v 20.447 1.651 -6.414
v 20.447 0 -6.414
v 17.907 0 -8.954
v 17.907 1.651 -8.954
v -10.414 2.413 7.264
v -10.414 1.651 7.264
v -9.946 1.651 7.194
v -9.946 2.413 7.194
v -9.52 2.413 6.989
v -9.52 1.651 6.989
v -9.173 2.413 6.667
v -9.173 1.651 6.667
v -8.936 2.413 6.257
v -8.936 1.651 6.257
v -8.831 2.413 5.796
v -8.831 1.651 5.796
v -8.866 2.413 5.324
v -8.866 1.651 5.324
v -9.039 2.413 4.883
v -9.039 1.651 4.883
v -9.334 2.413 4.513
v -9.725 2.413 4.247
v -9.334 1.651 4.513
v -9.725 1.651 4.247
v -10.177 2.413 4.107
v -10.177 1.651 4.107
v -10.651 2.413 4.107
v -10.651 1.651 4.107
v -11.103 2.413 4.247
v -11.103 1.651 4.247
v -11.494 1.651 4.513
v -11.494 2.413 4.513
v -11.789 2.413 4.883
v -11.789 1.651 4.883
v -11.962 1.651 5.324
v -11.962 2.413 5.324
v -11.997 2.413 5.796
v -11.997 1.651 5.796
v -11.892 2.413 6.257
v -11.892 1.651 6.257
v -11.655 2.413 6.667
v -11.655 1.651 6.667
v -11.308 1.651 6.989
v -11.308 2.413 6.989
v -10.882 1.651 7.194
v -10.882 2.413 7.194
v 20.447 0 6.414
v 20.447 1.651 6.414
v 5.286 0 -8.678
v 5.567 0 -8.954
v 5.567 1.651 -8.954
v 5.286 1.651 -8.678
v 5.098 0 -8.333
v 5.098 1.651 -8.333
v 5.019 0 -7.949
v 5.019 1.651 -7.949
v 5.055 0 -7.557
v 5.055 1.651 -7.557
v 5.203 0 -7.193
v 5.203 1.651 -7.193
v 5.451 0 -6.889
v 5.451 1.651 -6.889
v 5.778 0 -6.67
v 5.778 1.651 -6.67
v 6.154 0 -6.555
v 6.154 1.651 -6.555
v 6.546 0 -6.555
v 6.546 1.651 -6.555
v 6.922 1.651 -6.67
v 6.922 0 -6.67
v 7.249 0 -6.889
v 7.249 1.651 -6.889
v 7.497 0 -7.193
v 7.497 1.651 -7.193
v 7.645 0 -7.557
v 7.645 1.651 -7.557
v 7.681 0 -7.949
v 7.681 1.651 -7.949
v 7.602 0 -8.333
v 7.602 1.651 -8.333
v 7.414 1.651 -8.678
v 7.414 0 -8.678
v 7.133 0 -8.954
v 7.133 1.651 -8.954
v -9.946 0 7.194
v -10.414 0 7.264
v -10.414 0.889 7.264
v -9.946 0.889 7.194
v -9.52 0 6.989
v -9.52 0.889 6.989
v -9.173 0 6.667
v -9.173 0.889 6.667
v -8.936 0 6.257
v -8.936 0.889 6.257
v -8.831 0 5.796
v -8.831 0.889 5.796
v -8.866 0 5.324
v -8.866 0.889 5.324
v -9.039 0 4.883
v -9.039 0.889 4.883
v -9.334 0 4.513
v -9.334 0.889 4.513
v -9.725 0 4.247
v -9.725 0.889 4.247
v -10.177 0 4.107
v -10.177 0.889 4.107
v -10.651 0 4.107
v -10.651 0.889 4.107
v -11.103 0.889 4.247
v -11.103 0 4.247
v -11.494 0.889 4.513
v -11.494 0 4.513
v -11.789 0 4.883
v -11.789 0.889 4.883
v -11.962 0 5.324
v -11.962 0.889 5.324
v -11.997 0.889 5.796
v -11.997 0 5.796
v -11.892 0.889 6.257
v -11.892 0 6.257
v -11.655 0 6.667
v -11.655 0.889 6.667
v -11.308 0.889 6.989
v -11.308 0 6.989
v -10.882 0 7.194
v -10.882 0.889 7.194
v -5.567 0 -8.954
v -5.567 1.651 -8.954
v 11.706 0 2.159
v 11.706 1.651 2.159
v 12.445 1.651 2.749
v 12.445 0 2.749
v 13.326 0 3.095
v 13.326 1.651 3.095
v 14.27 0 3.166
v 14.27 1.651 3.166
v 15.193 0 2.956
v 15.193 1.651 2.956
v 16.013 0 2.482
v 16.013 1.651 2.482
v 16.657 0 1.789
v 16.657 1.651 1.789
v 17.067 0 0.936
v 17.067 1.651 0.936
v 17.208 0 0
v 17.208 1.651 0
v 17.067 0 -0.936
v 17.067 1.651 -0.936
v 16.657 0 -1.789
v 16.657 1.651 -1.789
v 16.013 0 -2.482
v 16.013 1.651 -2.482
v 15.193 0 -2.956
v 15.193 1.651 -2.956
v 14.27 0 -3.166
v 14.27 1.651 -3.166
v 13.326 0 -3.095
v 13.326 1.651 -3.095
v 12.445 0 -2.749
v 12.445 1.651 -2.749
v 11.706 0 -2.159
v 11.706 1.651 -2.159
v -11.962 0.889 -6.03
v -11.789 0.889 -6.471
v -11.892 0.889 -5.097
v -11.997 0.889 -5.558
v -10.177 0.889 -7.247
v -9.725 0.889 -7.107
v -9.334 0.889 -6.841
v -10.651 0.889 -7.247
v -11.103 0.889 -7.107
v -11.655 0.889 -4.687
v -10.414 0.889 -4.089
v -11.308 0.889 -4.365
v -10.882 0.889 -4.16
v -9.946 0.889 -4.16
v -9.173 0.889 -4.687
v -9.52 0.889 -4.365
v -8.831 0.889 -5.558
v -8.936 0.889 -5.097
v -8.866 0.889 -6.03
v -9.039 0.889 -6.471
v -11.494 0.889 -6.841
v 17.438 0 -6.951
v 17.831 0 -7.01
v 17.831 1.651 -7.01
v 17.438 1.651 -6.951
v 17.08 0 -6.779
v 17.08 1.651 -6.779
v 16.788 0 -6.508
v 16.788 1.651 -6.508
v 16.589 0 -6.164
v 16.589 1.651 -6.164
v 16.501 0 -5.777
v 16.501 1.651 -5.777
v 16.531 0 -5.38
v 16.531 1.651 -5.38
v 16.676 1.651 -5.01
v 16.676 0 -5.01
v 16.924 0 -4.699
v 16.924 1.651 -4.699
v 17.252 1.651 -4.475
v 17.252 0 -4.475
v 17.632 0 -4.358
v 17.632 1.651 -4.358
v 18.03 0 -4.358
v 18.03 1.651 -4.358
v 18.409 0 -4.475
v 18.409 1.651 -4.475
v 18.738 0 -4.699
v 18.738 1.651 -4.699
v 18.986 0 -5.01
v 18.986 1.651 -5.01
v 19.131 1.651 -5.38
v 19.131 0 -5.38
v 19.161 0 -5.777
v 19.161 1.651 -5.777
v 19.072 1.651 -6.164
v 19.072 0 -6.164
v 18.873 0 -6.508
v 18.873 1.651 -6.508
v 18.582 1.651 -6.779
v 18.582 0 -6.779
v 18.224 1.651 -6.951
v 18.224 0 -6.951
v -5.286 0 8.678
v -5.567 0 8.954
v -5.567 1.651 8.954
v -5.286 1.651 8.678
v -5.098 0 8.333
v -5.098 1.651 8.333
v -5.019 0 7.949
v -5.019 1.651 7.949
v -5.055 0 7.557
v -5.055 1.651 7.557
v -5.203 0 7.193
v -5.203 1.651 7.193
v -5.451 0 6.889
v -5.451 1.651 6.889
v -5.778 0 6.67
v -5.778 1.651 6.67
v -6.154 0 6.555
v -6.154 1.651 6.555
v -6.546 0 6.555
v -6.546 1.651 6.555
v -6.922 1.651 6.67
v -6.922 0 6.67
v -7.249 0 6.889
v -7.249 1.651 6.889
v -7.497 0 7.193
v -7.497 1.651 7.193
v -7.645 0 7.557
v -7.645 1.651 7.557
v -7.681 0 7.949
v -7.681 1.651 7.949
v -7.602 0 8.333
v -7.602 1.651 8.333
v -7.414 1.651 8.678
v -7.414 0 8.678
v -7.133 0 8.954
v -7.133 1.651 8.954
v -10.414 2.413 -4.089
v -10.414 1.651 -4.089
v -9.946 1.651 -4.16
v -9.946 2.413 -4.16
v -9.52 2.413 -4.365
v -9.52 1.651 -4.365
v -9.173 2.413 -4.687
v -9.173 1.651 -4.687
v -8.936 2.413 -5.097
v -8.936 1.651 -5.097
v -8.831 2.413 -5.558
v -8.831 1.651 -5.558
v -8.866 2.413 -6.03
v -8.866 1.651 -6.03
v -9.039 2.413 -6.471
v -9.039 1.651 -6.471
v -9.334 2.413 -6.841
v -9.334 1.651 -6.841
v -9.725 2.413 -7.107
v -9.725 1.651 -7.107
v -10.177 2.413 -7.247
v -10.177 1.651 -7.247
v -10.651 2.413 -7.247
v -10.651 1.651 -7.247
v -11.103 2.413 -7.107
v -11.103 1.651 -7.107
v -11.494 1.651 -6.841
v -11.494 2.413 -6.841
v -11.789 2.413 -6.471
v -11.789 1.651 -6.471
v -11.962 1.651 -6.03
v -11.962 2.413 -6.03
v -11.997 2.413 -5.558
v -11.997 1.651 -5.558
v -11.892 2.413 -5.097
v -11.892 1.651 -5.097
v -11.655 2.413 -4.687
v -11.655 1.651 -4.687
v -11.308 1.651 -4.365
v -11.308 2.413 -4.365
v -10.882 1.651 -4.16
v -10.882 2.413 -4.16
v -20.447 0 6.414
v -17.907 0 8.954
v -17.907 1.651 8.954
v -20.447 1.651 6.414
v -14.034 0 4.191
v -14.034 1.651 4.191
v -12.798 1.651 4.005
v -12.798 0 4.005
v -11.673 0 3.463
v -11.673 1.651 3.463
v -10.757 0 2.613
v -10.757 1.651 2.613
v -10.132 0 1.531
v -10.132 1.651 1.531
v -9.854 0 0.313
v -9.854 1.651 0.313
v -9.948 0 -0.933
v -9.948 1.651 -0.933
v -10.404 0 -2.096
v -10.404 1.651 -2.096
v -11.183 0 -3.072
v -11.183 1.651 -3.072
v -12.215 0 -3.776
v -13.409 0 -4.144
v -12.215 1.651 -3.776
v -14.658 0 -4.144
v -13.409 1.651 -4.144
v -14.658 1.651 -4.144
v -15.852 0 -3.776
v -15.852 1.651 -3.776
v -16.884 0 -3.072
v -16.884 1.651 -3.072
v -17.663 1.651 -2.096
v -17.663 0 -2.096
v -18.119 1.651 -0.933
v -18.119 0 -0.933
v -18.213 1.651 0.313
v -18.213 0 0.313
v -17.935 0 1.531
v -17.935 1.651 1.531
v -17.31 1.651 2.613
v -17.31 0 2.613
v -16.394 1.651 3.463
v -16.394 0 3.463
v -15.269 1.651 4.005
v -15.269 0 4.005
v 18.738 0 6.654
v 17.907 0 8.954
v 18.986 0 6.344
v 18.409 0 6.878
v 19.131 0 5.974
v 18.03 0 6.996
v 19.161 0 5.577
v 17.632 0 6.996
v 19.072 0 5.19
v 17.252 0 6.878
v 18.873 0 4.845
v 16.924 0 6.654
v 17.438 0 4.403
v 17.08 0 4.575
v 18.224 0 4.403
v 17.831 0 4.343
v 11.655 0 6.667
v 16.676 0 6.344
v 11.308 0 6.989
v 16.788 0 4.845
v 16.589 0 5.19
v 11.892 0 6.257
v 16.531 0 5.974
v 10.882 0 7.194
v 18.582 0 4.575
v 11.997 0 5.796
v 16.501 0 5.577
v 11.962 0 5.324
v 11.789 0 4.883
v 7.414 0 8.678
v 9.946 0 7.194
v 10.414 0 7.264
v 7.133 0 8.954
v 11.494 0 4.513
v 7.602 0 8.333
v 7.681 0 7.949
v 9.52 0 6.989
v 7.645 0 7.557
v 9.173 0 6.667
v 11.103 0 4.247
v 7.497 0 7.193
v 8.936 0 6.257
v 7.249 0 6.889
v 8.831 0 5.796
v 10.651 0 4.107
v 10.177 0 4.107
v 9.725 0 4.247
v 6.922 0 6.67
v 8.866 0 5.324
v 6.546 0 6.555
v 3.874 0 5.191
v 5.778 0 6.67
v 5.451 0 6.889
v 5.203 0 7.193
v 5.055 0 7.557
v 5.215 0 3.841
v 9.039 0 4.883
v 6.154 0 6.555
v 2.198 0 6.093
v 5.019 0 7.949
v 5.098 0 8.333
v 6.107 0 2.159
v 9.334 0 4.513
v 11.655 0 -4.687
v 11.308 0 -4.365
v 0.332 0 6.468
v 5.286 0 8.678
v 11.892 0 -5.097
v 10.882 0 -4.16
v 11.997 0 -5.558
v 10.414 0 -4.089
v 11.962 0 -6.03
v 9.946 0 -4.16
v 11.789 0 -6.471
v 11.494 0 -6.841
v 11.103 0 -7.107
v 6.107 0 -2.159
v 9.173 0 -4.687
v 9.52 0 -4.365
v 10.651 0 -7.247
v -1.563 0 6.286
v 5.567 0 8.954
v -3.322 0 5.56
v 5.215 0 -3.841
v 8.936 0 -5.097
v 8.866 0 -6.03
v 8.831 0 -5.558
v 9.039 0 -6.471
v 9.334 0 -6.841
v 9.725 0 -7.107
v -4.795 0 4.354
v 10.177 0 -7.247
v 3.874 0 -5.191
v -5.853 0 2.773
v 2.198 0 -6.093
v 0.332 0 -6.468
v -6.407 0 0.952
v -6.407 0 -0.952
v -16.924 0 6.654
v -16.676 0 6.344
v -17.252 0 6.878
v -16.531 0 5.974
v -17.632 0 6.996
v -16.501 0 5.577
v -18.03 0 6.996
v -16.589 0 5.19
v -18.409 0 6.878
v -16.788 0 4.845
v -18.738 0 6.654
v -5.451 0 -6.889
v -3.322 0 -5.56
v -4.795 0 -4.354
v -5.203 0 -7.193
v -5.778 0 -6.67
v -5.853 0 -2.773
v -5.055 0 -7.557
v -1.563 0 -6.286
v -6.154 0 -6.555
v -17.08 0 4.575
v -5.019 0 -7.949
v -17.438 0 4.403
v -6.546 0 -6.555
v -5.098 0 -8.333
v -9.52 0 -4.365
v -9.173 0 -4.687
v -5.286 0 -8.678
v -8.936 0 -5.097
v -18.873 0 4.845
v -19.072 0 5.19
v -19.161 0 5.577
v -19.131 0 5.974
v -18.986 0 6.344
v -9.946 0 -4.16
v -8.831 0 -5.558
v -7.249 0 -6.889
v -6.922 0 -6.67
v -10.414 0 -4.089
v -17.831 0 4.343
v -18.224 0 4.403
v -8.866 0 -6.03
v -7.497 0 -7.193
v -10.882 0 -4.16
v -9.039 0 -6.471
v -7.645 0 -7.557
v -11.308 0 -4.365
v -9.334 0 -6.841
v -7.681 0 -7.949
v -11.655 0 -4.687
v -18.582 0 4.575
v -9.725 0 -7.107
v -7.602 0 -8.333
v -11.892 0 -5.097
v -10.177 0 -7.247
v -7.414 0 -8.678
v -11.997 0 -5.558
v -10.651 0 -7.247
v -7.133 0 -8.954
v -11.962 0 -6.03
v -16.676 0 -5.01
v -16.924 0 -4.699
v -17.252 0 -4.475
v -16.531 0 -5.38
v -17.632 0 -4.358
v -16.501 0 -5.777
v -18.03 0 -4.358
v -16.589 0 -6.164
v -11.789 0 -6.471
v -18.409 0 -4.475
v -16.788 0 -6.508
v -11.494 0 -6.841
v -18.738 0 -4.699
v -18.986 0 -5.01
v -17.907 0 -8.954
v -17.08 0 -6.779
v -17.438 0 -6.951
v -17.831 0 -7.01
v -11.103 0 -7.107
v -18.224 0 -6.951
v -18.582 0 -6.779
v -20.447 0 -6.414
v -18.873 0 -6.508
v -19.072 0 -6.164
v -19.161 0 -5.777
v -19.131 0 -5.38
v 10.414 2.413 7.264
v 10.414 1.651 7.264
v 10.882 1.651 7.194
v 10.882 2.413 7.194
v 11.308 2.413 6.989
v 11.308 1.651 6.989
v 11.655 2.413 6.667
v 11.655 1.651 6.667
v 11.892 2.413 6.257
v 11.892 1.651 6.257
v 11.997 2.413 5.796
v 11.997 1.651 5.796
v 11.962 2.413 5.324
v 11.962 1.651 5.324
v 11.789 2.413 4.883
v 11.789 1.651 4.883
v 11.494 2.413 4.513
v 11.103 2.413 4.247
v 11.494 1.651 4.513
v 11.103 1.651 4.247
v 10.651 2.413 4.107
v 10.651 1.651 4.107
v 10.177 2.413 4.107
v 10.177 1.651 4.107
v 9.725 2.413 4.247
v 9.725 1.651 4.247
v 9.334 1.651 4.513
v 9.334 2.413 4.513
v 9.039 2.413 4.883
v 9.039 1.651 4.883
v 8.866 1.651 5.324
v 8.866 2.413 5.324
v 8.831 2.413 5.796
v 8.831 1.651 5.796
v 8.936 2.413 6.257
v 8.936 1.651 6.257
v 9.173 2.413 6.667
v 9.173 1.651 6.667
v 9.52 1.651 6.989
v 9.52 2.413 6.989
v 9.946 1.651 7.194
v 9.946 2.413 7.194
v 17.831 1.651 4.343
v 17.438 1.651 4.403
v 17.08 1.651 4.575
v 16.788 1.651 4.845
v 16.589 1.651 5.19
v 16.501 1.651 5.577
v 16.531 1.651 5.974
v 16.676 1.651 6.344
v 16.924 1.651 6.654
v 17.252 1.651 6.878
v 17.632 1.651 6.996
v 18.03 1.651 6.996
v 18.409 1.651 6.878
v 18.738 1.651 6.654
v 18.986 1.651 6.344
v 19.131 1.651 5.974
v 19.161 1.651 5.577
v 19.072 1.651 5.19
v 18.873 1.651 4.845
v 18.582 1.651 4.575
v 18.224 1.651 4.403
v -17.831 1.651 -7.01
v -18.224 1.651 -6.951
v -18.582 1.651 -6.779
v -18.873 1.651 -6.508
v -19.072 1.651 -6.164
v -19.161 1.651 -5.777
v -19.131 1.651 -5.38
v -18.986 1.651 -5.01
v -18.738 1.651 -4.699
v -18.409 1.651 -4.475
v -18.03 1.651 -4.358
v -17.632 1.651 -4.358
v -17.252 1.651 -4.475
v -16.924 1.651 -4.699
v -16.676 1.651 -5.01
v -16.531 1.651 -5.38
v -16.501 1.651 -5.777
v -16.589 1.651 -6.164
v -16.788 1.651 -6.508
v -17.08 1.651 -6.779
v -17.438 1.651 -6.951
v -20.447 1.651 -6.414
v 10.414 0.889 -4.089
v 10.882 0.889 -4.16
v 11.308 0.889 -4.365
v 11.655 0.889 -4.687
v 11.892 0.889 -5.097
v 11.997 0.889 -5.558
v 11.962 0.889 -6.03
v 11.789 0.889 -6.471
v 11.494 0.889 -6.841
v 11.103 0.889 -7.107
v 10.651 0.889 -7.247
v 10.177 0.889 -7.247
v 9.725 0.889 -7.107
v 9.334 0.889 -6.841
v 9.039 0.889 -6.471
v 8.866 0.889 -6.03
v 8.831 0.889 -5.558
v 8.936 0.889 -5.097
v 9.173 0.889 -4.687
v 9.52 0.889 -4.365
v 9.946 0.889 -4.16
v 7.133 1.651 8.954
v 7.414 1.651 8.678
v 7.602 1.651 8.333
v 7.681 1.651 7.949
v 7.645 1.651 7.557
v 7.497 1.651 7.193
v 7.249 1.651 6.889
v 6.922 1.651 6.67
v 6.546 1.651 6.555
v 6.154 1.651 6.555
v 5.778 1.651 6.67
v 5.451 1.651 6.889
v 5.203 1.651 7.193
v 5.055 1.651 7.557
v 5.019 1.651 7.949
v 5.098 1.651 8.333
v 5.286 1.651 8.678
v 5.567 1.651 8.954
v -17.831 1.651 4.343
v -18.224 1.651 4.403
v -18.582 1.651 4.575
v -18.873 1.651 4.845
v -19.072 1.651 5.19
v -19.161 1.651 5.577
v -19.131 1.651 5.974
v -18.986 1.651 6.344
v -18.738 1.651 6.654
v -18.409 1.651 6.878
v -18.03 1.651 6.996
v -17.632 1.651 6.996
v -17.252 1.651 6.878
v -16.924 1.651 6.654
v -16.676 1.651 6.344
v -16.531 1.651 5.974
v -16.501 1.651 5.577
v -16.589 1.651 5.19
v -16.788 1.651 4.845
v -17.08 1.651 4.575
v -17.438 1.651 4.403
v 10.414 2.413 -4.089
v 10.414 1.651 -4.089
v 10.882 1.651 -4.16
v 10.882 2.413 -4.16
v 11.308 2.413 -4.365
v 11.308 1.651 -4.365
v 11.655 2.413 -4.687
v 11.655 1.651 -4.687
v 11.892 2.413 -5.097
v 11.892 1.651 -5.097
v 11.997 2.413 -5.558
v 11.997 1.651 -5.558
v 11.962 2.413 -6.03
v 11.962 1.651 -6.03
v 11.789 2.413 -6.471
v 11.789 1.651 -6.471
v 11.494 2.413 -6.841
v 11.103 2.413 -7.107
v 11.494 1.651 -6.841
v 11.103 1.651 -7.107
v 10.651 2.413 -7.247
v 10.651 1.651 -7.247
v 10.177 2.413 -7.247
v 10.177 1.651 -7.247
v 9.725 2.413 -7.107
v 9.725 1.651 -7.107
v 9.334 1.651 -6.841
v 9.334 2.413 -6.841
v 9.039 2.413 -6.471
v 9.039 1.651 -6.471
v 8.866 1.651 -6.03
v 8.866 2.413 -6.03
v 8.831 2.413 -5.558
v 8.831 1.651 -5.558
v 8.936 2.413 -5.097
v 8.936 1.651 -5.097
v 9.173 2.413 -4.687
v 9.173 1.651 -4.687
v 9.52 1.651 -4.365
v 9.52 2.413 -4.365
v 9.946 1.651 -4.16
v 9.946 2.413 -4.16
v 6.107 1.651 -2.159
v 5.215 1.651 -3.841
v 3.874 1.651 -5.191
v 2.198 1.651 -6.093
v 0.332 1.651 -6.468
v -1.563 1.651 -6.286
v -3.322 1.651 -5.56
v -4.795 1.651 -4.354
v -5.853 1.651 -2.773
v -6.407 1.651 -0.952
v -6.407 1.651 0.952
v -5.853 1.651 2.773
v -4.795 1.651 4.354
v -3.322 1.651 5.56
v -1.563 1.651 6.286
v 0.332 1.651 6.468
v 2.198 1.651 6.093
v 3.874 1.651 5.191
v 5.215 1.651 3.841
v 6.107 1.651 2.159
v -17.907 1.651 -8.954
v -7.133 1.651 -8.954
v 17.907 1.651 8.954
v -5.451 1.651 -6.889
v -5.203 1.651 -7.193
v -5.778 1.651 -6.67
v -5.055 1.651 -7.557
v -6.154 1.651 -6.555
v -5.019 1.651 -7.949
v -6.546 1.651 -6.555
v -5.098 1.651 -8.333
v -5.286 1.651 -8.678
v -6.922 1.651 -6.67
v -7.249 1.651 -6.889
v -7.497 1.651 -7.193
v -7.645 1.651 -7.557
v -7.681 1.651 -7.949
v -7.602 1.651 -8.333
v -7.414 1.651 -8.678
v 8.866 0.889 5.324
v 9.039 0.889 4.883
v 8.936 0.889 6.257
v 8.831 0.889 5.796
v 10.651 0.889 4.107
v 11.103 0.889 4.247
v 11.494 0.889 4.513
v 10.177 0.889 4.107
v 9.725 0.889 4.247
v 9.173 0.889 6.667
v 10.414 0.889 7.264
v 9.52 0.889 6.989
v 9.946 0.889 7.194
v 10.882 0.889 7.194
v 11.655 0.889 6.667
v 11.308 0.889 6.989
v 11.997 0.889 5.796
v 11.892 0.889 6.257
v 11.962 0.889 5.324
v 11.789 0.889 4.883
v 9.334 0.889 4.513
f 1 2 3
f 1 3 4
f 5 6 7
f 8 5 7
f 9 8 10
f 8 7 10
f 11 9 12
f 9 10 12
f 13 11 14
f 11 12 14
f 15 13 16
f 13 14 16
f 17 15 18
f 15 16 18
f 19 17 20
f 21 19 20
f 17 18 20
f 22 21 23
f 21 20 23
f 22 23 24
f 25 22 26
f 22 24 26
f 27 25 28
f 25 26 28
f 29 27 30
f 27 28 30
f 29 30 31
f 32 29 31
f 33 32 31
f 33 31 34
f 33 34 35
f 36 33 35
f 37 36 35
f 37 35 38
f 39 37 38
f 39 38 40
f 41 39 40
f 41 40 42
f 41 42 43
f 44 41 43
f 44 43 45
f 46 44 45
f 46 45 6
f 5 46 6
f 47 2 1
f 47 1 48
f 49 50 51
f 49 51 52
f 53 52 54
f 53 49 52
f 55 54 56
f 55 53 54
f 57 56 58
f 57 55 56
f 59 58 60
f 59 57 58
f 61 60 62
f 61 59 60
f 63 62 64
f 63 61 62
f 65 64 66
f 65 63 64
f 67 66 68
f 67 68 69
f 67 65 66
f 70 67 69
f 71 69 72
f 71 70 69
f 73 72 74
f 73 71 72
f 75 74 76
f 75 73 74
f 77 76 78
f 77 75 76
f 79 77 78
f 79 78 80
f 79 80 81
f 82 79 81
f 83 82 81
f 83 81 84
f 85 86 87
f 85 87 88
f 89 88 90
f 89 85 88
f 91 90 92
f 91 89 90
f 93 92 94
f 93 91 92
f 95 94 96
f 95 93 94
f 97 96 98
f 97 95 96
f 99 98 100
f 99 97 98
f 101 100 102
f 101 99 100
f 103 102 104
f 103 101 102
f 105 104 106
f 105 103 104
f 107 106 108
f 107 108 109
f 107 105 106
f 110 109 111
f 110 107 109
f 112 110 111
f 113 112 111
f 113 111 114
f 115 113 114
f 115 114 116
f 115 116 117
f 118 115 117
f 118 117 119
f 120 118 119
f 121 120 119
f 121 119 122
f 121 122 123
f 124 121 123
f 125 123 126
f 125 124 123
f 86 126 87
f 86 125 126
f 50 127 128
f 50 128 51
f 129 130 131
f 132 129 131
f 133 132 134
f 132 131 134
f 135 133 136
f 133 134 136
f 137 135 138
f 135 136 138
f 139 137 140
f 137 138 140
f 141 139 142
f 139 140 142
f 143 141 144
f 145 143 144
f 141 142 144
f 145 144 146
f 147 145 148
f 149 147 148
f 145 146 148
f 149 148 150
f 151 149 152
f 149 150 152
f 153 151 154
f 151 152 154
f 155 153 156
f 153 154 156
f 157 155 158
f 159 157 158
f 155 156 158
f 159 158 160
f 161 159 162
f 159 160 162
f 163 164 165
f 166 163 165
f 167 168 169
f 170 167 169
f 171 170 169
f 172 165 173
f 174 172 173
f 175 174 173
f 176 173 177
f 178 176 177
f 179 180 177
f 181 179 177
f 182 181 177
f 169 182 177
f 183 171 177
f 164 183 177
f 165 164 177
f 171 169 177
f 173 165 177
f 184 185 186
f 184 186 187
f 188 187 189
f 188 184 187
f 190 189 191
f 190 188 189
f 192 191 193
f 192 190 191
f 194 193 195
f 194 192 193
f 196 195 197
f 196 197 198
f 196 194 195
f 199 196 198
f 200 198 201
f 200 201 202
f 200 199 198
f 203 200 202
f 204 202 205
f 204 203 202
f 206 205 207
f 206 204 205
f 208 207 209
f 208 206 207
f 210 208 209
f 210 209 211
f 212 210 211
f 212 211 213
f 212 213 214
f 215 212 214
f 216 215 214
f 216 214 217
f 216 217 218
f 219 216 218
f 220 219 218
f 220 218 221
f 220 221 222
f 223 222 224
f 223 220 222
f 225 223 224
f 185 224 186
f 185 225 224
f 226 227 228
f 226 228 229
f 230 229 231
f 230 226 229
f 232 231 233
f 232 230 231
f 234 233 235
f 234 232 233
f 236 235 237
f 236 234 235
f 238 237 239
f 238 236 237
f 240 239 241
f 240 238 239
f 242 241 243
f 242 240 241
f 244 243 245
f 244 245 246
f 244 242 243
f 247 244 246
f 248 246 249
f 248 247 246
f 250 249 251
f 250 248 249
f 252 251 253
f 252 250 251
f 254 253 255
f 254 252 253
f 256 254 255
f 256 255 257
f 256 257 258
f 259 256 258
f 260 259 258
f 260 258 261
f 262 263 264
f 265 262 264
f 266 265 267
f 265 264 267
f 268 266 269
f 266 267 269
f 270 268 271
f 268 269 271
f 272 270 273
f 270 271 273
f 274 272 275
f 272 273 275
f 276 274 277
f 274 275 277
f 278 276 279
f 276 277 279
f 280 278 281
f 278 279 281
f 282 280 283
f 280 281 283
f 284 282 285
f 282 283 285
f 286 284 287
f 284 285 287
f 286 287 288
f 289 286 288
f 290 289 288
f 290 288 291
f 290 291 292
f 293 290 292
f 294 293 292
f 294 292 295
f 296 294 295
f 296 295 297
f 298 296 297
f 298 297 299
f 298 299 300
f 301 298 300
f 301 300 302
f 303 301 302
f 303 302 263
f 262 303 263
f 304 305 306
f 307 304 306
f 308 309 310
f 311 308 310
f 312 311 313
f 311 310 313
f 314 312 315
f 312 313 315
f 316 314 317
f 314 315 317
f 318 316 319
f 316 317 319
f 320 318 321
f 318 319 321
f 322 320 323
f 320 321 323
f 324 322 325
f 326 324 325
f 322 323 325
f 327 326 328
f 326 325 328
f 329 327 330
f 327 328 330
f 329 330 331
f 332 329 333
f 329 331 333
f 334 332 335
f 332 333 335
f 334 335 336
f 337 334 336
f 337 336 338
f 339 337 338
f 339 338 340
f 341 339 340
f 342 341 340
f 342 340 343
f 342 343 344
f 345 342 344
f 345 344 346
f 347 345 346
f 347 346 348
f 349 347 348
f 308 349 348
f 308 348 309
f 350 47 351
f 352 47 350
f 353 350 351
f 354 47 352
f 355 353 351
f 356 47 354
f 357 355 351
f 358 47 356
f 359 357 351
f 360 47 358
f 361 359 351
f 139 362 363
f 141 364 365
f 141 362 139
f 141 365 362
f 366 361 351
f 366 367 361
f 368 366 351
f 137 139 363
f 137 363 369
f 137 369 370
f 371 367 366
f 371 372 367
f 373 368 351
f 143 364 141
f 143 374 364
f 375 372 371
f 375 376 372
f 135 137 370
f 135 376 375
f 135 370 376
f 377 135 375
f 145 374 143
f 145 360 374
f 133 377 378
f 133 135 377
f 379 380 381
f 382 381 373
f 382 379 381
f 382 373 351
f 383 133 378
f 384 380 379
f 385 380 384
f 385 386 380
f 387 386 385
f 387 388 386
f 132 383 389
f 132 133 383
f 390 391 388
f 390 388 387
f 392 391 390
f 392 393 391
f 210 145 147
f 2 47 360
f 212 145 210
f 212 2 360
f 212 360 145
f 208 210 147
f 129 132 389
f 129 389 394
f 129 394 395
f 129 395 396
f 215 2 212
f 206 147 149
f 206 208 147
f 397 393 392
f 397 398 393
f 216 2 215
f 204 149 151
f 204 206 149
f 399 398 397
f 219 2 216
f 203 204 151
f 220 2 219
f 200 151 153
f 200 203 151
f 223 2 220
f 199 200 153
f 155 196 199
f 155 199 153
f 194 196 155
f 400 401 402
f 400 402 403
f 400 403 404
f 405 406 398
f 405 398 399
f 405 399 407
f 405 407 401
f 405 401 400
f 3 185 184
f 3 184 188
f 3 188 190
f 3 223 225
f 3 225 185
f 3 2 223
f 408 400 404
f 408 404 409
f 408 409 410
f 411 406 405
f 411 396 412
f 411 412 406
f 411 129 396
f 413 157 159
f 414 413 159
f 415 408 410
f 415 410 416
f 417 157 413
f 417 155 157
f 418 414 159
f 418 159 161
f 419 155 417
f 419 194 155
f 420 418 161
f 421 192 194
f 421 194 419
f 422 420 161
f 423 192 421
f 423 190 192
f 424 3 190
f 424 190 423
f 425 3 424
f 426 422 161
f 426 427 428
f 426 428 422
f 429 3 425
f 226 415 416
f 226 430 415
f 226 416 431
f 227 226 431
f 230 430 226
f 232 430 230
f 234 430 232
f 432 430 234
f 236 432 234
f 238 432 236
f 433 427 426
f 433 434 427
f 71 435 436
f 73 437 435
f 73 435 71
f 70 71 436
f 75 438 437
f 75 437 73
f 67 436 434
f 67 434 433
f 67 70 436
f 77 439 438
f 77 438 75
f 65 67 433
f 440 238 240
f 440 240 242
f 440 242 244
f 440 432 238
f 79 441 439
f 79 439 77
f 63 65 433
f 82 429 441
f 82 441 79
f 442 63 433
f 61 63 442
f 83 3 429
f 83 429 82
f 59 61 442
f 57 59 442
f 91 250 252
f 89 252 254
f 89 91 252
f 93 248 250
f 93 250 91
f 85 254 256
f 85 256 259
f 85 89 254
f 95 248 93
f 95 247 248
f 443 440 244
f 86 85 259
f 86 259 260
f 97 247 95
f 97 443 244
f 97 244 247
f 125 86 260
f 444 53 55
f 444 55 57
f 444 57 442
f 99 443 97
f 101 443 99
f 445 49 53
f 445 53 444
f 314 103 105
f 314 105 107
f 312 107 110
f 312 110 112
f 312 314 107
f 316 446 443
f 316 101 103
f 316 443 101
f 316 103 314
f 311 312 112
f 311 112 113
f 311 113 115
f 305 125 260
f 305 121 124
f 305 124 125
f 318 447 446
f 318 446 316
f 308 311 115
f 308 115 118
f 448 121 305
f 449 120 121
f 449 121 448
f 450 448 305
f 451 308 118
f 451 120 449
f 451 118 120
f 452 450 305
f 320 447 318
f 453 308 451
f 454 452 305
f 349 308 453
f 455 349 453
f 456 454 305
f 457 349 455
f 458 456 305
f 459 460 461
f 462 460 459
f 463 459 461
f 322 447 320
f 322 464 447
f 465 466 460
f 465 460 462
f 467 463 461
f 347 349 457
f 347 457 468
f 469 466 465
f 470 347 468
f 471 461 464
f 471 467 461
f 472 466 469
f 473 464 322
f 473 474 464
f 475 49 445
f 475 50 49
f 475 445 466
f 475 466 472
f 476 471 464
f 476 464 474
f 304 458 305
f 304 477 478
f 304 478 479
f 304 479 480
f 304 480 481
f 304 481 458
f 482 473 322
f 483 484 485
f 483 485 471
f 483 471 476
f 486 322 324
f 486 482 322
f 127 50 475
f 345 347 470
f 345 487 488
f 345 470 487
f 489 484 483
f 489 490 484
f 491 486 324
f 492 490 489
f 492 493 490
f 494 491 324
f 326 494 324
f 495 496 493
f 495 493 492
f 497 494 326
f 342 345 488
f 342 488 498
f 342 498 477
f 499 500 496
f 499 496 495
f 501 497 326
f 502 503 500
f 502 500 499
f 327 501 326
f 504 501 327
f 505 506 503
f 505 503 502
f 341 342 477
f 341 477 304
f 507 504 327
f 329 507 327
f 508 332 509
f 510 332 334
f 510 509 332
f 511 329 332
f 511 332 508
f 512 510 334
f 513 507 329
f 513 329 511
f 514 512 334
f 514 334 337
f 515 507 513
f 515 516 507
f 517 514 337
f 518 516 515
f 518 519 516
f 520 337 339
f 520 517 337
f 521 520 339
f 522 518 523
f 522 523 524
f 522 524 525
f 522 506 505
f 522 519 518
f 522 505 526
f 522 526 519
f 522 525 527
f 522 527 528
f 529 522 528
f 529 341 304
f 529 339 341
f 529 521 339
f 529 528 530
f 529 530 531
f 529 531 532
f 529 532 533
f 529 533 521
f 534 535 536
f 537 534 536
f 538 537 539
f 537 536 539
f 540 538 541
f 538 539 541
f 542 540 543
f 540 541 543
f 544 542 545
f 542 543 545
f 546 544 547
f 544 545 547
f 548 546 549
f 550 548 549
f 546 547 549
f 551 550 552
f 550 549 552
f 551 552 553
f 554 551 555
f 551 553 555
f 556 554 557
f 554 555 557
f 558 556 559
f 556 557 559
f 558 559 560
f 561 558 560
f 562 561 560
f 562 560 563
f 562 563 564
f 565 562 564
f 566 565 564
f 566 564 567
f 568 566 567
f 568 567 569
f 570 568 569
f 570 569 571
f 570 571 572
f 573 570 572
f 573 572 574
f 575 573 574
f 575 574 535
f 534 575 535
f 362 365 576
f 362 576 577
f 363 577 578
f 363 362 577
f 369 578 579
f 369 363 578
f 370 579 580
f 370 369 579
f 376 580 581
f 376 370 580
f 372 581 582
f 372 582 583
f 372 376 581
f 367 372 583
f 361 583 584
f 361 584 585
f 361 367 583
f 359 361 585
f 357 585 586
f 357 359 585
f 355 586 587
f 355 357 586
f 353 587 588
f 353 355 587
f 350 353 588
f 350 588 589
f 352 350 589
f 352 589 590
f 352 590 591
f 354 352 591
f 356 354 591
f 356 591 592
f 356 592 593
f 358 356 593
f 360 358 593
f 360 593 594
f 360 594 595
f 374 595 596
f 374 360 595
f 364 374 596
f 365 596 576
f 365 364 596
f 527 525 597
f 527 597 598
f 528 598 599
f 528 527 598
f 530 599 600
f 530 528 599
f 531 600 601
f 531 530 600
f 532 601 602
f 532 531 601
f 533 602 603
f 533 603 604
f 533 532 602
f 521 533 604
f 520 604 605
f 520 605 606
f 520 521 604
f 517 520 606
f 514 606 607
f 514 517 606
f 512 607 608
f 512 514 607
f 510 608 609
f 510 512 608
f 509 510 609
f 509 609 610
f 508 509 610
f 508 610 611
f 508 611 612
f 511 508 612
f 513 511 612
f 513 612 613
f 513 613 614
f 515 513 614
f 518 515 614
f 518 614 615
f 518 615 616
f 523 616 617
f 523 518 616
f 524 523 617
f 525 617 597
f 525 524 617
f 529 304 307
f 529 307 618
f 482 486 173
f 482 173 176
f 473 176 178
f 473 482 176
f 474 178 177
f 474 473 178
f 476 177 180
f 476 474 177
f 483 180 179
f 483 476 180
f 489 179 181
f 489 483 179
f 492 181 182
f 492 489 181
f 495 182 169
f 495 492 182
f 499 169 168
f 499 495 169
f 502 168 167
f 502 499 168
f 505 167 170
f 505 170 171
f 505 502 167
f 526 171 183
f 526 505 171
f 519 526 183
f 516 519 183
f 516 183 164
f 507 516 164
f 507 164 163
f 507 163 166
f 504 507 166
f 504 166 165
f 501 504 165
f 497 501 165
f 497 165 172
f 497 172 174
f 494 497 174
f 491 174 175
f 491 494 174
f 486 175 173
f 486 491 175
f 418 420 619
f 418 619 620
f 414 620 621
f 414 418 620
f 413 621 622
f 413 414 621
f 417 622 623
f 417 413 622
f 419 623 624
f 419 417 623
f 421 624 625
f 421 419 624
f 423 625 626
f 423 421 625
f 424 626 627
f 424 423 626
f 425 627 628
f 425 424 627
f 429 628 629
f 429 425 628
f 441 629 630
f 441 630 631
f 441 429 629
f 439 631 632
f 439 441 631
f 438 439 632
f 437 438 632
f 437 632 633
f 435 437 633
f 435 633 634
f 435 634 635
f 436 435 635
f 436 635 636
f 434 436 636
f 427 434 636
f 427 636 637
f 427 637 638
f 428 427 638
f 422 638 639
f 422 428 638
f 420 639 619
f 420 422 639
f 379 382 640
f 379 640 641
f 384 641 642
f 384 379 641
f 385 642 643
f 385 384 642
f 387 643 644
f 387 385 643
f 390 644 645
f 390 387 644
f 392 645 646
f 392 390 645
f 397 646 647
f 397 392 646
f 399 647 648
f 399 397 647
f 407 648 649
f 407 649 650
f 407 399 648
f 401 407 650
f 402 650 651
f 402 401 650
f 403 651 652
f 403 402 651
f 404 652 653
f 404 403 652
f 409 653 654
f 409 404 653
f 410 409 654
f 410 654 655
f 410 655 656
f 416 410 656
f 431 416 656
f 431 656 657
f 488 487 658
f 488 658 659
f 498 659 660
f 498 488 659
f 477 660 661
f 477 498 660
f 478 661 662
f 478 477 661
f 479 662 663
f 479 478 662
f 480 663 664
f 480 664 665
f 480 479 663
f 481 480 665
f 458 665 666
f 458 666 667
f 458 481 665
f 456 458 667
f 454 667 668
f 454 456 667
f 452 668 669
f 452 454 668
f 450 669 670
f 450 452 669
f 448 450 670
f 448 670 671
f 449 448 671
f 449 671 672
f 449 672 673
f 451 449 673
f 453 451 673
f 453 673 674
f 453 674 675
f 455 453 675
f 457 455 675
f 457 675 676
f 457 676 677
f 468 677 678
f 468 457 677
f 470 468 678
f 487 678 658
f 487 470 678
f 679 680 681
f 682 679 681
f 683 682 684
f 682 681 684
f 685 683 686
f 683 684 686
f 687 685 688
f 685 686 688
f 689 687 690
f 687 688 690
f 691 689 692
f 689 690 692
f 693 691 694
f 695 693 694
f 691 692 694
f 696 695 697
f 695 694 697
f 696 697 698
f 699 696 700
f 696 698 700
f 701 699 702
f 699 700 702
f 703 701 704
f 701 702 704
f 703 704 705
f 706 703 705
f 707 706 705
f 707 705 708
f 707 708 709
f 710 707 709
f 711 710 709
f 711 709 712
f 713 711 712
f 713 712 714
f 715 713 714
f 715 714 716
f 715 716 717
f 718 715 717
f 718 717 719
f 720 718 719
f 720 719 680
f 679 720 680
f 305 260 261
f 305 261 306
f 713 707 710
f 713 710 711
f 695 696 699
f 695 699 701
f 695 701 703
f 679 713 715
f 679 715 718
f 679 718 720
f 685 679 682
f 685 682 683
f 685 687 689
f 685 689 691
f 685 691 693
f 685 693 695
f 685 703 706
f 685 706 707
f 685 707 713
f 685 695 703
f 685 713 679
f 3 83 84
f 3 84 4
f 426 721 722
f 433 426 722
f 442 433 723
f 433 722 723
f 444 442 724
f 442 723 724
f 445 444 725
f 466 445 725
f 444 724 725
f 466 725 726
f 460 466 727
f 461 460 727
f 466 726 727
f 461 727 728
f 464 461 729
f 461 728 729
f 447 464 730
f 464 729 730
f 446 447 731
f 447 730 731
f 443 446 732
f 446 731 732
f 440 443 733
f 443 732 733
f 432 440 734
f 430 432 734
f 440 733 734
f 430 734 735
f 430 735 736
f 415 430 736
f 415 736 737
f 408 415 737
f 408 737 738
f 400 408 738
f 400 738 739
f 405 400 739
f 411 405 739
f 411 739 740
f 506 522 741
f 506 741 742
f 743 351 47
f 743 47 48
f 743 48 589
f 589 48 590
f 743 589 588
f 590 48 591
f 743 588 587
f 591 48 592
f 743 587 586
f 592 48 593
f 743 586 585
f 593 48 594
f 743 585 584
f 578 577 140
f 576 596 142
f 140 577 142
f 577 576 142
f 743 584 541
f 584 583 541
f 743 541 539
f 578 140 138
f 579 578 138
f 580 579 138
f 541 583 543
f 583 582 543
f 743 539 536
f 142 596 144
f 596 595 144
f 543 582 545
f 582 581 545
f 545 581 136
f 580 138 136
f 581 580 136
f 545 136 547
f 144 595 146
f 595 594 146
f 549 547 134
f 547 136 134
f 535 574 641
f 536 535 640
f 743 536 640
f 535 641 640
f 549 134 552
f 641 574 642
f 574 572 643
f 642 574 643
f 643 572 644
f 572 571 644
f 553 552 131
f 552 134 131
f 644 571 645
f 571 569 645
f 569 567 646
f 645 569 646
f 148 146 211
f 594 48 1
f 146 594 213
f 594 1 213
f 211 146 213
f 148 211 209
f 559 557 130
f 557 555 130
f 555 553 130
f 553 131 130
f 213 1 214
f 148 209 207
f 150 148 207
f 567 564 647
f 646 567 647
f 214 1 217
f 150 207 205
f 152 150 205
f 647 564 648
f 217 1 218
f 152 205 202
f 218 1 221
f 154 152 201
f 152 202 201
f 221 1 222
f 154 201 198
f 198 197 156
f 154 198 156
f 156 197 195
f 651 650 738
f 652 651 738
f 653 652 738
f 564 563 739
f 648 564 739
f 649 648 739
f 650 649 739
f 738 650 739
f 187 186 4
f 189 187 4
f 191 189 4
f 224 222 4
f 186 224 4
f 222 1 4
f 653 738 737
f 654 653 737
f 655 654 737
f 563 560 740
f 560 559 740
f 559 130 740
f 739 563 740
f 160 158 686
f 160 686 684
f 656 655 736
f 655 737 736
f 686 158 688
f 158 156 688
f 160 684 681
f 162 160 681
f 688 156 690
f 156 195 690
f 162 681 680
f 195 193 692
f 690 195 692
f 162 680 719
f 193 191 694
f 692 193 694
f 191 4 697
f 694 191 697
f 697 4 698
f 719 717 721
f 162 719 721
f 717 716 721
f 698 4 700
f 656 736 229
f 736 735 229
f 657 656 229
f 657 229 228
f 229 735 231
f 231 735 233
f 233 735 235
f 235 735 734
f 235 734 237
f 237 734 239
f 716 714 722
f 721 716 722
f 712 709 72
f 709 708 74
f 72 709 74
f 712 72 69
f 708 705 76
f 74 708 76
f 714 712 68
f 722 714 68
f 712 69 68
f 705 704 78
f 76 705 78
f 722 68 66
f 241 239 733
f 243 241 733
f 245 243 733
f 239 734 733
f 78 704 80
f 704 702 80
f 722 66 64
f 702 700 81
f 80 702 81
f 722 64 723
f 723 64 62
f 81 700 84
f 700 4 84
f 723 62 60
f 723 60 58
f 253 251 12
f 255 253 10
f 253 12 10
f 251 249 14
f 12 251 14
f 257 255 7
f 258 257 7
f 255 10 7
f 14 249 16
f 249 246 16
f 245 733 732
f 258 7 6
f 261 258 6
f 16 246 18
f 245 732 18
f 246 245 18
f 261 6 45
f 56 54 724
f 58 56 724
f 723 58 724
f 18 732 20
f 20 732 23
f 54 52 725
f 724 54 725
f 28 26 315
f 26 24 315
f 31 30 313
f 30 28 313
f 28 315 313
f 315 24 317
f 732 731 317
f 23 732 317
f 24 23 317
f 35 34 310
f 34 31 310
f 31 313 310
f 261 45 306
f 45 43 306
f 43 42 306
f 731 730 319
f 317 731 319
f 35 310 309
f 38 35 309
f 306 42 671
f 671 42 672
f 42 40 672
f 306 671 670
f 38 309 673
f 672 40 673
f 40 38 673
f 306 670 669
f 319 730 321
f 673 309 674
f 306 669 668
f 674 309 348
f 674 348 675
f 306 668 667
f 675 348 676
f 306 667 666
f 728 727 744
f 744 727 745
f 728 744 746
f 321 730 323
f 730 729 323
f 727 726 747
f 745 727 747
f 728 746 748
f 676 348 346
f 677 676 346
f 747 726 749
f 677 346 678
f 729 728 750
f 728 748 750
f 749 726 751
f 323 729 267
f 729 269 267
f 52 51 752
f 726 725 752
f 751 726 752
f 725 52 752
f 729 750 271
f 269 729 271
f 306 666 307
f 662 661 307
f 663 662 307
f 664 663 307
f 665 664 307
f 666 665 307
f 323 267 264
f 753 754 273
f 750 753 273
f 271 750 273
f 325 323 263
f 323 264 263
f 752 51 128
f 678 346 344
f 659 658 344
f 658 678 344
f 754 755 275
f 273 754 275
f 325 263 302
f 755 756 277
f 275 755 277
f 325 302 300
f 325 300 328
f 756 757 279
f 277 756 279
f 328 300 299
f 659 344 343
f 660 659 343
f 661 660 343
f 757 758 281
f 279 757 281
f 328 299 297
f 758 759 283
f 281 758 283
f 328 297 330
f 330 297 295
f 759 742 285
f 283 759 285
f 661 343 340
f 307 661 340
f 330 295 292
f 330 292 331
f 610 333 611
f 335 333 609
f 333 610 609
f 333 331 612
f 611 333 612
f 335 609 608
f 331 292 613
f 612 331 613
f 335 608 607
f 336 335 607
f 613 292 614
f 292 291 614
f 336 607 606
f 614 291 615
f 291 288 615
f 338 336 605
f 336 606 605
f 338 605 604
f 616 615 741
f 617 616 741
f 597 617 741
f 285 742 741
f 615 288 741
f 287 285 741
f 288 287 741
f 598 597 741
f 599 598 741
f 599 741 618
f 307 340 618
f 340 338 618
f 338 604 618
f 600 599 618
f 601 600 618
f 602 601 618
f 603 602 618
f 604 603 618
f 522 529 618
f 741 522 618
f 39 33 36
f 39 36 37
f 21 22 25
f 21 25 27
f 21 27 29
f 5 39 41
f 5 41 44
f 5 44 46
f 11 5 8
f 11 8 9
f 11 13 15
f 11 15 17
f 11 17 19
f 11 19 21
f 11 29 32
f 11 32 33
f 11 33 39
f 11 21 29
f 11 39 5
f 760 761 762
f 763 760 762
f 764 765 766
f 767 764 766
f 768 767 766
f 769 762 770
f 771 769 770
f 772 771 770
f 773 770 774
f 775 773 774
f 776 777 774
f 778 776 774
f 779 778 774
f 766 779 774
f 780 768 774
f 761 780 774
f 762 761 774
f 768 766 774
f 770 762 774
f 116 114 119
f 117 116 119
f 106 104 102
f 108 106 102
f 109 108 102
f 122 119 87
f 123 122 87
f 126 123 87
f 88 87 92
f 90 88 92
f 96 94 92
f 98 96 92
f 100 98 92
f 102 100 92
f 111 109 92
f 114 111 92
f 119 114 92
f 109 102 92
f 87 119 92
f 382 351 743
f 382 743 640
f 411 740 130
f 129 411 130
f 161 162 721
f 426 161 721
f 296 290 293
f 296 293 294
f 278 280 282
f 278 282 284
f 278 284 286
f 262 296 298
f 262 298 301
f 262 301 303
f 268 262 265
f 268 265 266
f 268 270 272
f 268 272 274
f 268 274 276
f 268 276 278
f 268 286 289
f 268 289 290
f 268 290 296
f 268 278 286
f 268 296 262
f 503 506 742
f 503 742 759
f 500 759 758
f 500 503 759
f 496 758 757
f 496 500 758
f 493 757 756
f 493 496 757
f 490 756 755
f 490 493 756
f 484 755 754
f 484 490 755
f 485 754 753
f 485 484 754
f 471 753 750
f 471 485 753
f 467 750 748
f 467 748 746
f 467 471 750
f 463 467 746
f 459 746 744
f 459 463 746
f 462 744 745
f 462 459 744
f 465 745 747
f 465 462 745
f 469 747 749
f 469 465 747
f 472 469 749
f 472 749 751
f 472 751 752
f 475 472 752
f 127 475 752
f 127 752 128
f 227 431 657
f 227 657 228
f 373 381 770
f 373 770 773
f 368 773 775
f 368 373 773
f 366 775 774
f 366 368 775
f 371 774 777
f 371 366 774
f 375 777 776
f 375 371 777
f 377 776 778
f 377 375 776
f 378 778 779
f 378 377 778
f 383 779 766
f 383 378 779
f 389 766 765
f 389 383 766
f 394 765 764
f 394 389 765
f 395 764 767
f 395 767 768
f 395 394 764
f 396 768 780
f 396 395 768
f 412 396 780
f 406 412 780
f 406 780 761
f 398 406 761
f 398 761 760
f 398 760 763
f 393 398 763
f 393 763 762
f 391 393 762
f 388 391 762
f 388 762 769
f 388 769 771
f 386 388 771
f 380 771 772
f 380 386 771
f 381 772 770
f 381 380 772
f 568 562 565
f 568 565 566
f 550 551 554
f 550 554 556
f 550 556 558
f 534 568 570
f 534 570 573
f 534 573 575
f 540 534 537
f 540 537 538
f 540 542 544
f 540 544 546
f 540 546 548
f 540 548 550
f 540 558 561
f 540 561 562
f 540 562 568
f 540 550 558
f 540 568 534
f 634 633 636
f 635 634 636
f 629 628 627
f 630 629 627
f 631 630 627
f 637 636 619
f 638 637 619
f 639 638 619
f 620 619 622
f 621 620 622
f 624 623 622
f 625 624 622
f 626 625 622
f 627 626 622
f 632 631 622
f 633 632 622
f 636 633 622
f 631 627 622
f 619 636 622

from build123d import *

# Parameters (mm, degrees)
SKETCH1_R           = 1.3335
SKETCH1_R_2         = 1.5875
BOSS_EXTRUDE1_DEPTH = 1.651
CHAMFER1_SIZE       = 2.54
SKETCH1_2_R         = 1.5875
BOSS_EXTRUDE2_DEPTH = 2.413
SKETCH1_3_R         = 1.5875
CUT_EXTRUDE1_DEPTH  = 0.889
SKETCH5_R           = 4.191
CUT_EXTRUDE5_DEPTH  = 23.382376376


with BuildPart() as part:
    # Sketch1 → Boss-Extrude1 (new body)
    with BuildSketch(Plane(origin=(0, 0, 0), x_dir=(1, 0, 0), z_dir=(0, 1, 0))):
        with BuildLine():
            Line((-5.567119422, 8.9535), (5.567119422, 8.9535))
            ThreePointArc((5.567119422, 8.9535), (6.35, 6.5405), (7.132880578, 8.9535))
            Line((7.132880578, 8.9535), (20.447, 8.9535))
            Line((20.447, 8.9535), (20.447, -8.9535))
            Line((20.447, -8.9535), (7.132880578, -8.9535))
            ThreePointArc((7.132880578, -8.9535), (6.35, -6.5405), (5.567119422, -8.9535))
            Line((5.567119422, -8.9535), (-5.567119422, -8.9535))
            ThreePointArc((-5.567119422, -8.9535), (-6.35, -6.5405), (-7.132880578, -8.9535))
            Line((-7.132880578, -8.9535), (-20.447, -8.9535))
            Line((-20.447, -8.9535), (-20.447, 8.9535))
            Line((-20.447, 8.9535), (-7.132880578, 8.9535))
            ThreePointArc((-7.132880578, 8.9535), (-6.35, 6.5405), (-5.567119422, 8.9535))
        make_face()
        with Locations((-17.8308, 5.6769)):
            Circle(SKETCH1_R, mode=Mode.SUBTRACT)
        with Locations((17.8308, 5.6769)):
            Circle(SKETCH1_R, mode=Mode.SUBTRACT)
        with Locations((17.8308, -5.6769)):
            Circle(SKETCH1_R, mode=Mode.SUBTRACT)
        with Locations((-17.8308, -5.6769)):
            Circle(SKETCH1_R, mode=Mode.SUBTRACT)
        with Locations((-10.414, 5.6769)):
            Circle(SKETCH1_R_2, mode=Mode.SUBTRACT)
        with Locations((10.414, 5.6769)):
            Circle(SKETCH1_R_2, mode=Mode.SUBTRACT)
        with Locations((10.414, -5.6769)):
            Circle(SKETCH1_R_2, mode=Mode.SUBTRACT)
        with Locations((-10.414, -5.6769)):
            Circle(SKETCH1_R_2, mode=Mode.SUBTRACT)
    extrude(amount=BOSS_EXTRUDE1_DEPTH)

    # Chamfer1
    chamfer1_edges = [part.edges().sort_by_distance(p)[0] for p in [
        (-20.447, 0.8255, 8.9535),
        (-20.447, 0.8255, -8.9535),
        (20.447, 0.8255, -8.9535),
        (20.447, 0.8255, 8.9535),
    ]]
    chamfer(chamfer1_edges, length=CHAMFER1_SIZE)

    # Sketch1<2> → Boss-Extrude2 (add)
    with BuildSketch(Plane(origin=(0, 0, 0), x_dir=(1, 0, 0), z_dir=(0, 1, 0))):
        with Locations((-10.414, 5.6769)):
            Circle(SKETCH1_2_R)
        with Locations((10.414, 5.6769)):
            Circle(SKETCH1_2_R)
        with Locations((10.414, -5.6769)):
            Circle(SKETCH1_2_R)
        with Locations((-10.414, -5.6769)):
            Circle(SKETCH1_2_R)
    extrude(amount=BOSS_EXTRUDE2_DEPTH)

    # Sketch1<3> → Cut-Extrude1 (cut)
    with BuildSketch(Plane(origin=(0, 0, 0), x_dir=(1, 0, 0), z_dir=(0, 1, 0))):
        with Locations((-10.414, 5.6769)):
            Circle(SKETCH1_3_R)
        with Locations((10.414, 5.6769)):
            Circle(SKETCH1_3_R)
        with Locations((10.414, -5.6769)):
            Circle(SKETCH1_3_R)
        with Locations((-10.414, -5.6769)):
            Circle(SKETCH1_3_R)
    extrude(amount=CUT_EXTRUDE1_DEPTH, mode=Mode.SUBTRACT)

    # Sketch5 → Cut-Extrude5 (cut, through all)
    with BuildSketch(Plane(origin=(0, 1.651, 0), x_dir=(1, 0, 0), z_dir=(0, 1, 0))):
        with Locations((-14.0335, 0)):
            Circle(SKETCH5_R)
        with BuildLine():
            Line((6.106574162, -2.159), (11.705551547, -2.159))
            ThreePointArc((11.705551547, -2.159), (17.2085, 0), (11.705551547, 2.159))
            Line((11.705551547, 2.159), (6.106574162, 2.159))
            ThreePointArc((6.106574162, 2.159), (-6.477, 0), (6.106574162, -2.159))
        make_face()
    extrude(amount=-CUT_EXTRUDE5_DEPTH, mode=Mode.SUBTRACT)


solid = part.part
